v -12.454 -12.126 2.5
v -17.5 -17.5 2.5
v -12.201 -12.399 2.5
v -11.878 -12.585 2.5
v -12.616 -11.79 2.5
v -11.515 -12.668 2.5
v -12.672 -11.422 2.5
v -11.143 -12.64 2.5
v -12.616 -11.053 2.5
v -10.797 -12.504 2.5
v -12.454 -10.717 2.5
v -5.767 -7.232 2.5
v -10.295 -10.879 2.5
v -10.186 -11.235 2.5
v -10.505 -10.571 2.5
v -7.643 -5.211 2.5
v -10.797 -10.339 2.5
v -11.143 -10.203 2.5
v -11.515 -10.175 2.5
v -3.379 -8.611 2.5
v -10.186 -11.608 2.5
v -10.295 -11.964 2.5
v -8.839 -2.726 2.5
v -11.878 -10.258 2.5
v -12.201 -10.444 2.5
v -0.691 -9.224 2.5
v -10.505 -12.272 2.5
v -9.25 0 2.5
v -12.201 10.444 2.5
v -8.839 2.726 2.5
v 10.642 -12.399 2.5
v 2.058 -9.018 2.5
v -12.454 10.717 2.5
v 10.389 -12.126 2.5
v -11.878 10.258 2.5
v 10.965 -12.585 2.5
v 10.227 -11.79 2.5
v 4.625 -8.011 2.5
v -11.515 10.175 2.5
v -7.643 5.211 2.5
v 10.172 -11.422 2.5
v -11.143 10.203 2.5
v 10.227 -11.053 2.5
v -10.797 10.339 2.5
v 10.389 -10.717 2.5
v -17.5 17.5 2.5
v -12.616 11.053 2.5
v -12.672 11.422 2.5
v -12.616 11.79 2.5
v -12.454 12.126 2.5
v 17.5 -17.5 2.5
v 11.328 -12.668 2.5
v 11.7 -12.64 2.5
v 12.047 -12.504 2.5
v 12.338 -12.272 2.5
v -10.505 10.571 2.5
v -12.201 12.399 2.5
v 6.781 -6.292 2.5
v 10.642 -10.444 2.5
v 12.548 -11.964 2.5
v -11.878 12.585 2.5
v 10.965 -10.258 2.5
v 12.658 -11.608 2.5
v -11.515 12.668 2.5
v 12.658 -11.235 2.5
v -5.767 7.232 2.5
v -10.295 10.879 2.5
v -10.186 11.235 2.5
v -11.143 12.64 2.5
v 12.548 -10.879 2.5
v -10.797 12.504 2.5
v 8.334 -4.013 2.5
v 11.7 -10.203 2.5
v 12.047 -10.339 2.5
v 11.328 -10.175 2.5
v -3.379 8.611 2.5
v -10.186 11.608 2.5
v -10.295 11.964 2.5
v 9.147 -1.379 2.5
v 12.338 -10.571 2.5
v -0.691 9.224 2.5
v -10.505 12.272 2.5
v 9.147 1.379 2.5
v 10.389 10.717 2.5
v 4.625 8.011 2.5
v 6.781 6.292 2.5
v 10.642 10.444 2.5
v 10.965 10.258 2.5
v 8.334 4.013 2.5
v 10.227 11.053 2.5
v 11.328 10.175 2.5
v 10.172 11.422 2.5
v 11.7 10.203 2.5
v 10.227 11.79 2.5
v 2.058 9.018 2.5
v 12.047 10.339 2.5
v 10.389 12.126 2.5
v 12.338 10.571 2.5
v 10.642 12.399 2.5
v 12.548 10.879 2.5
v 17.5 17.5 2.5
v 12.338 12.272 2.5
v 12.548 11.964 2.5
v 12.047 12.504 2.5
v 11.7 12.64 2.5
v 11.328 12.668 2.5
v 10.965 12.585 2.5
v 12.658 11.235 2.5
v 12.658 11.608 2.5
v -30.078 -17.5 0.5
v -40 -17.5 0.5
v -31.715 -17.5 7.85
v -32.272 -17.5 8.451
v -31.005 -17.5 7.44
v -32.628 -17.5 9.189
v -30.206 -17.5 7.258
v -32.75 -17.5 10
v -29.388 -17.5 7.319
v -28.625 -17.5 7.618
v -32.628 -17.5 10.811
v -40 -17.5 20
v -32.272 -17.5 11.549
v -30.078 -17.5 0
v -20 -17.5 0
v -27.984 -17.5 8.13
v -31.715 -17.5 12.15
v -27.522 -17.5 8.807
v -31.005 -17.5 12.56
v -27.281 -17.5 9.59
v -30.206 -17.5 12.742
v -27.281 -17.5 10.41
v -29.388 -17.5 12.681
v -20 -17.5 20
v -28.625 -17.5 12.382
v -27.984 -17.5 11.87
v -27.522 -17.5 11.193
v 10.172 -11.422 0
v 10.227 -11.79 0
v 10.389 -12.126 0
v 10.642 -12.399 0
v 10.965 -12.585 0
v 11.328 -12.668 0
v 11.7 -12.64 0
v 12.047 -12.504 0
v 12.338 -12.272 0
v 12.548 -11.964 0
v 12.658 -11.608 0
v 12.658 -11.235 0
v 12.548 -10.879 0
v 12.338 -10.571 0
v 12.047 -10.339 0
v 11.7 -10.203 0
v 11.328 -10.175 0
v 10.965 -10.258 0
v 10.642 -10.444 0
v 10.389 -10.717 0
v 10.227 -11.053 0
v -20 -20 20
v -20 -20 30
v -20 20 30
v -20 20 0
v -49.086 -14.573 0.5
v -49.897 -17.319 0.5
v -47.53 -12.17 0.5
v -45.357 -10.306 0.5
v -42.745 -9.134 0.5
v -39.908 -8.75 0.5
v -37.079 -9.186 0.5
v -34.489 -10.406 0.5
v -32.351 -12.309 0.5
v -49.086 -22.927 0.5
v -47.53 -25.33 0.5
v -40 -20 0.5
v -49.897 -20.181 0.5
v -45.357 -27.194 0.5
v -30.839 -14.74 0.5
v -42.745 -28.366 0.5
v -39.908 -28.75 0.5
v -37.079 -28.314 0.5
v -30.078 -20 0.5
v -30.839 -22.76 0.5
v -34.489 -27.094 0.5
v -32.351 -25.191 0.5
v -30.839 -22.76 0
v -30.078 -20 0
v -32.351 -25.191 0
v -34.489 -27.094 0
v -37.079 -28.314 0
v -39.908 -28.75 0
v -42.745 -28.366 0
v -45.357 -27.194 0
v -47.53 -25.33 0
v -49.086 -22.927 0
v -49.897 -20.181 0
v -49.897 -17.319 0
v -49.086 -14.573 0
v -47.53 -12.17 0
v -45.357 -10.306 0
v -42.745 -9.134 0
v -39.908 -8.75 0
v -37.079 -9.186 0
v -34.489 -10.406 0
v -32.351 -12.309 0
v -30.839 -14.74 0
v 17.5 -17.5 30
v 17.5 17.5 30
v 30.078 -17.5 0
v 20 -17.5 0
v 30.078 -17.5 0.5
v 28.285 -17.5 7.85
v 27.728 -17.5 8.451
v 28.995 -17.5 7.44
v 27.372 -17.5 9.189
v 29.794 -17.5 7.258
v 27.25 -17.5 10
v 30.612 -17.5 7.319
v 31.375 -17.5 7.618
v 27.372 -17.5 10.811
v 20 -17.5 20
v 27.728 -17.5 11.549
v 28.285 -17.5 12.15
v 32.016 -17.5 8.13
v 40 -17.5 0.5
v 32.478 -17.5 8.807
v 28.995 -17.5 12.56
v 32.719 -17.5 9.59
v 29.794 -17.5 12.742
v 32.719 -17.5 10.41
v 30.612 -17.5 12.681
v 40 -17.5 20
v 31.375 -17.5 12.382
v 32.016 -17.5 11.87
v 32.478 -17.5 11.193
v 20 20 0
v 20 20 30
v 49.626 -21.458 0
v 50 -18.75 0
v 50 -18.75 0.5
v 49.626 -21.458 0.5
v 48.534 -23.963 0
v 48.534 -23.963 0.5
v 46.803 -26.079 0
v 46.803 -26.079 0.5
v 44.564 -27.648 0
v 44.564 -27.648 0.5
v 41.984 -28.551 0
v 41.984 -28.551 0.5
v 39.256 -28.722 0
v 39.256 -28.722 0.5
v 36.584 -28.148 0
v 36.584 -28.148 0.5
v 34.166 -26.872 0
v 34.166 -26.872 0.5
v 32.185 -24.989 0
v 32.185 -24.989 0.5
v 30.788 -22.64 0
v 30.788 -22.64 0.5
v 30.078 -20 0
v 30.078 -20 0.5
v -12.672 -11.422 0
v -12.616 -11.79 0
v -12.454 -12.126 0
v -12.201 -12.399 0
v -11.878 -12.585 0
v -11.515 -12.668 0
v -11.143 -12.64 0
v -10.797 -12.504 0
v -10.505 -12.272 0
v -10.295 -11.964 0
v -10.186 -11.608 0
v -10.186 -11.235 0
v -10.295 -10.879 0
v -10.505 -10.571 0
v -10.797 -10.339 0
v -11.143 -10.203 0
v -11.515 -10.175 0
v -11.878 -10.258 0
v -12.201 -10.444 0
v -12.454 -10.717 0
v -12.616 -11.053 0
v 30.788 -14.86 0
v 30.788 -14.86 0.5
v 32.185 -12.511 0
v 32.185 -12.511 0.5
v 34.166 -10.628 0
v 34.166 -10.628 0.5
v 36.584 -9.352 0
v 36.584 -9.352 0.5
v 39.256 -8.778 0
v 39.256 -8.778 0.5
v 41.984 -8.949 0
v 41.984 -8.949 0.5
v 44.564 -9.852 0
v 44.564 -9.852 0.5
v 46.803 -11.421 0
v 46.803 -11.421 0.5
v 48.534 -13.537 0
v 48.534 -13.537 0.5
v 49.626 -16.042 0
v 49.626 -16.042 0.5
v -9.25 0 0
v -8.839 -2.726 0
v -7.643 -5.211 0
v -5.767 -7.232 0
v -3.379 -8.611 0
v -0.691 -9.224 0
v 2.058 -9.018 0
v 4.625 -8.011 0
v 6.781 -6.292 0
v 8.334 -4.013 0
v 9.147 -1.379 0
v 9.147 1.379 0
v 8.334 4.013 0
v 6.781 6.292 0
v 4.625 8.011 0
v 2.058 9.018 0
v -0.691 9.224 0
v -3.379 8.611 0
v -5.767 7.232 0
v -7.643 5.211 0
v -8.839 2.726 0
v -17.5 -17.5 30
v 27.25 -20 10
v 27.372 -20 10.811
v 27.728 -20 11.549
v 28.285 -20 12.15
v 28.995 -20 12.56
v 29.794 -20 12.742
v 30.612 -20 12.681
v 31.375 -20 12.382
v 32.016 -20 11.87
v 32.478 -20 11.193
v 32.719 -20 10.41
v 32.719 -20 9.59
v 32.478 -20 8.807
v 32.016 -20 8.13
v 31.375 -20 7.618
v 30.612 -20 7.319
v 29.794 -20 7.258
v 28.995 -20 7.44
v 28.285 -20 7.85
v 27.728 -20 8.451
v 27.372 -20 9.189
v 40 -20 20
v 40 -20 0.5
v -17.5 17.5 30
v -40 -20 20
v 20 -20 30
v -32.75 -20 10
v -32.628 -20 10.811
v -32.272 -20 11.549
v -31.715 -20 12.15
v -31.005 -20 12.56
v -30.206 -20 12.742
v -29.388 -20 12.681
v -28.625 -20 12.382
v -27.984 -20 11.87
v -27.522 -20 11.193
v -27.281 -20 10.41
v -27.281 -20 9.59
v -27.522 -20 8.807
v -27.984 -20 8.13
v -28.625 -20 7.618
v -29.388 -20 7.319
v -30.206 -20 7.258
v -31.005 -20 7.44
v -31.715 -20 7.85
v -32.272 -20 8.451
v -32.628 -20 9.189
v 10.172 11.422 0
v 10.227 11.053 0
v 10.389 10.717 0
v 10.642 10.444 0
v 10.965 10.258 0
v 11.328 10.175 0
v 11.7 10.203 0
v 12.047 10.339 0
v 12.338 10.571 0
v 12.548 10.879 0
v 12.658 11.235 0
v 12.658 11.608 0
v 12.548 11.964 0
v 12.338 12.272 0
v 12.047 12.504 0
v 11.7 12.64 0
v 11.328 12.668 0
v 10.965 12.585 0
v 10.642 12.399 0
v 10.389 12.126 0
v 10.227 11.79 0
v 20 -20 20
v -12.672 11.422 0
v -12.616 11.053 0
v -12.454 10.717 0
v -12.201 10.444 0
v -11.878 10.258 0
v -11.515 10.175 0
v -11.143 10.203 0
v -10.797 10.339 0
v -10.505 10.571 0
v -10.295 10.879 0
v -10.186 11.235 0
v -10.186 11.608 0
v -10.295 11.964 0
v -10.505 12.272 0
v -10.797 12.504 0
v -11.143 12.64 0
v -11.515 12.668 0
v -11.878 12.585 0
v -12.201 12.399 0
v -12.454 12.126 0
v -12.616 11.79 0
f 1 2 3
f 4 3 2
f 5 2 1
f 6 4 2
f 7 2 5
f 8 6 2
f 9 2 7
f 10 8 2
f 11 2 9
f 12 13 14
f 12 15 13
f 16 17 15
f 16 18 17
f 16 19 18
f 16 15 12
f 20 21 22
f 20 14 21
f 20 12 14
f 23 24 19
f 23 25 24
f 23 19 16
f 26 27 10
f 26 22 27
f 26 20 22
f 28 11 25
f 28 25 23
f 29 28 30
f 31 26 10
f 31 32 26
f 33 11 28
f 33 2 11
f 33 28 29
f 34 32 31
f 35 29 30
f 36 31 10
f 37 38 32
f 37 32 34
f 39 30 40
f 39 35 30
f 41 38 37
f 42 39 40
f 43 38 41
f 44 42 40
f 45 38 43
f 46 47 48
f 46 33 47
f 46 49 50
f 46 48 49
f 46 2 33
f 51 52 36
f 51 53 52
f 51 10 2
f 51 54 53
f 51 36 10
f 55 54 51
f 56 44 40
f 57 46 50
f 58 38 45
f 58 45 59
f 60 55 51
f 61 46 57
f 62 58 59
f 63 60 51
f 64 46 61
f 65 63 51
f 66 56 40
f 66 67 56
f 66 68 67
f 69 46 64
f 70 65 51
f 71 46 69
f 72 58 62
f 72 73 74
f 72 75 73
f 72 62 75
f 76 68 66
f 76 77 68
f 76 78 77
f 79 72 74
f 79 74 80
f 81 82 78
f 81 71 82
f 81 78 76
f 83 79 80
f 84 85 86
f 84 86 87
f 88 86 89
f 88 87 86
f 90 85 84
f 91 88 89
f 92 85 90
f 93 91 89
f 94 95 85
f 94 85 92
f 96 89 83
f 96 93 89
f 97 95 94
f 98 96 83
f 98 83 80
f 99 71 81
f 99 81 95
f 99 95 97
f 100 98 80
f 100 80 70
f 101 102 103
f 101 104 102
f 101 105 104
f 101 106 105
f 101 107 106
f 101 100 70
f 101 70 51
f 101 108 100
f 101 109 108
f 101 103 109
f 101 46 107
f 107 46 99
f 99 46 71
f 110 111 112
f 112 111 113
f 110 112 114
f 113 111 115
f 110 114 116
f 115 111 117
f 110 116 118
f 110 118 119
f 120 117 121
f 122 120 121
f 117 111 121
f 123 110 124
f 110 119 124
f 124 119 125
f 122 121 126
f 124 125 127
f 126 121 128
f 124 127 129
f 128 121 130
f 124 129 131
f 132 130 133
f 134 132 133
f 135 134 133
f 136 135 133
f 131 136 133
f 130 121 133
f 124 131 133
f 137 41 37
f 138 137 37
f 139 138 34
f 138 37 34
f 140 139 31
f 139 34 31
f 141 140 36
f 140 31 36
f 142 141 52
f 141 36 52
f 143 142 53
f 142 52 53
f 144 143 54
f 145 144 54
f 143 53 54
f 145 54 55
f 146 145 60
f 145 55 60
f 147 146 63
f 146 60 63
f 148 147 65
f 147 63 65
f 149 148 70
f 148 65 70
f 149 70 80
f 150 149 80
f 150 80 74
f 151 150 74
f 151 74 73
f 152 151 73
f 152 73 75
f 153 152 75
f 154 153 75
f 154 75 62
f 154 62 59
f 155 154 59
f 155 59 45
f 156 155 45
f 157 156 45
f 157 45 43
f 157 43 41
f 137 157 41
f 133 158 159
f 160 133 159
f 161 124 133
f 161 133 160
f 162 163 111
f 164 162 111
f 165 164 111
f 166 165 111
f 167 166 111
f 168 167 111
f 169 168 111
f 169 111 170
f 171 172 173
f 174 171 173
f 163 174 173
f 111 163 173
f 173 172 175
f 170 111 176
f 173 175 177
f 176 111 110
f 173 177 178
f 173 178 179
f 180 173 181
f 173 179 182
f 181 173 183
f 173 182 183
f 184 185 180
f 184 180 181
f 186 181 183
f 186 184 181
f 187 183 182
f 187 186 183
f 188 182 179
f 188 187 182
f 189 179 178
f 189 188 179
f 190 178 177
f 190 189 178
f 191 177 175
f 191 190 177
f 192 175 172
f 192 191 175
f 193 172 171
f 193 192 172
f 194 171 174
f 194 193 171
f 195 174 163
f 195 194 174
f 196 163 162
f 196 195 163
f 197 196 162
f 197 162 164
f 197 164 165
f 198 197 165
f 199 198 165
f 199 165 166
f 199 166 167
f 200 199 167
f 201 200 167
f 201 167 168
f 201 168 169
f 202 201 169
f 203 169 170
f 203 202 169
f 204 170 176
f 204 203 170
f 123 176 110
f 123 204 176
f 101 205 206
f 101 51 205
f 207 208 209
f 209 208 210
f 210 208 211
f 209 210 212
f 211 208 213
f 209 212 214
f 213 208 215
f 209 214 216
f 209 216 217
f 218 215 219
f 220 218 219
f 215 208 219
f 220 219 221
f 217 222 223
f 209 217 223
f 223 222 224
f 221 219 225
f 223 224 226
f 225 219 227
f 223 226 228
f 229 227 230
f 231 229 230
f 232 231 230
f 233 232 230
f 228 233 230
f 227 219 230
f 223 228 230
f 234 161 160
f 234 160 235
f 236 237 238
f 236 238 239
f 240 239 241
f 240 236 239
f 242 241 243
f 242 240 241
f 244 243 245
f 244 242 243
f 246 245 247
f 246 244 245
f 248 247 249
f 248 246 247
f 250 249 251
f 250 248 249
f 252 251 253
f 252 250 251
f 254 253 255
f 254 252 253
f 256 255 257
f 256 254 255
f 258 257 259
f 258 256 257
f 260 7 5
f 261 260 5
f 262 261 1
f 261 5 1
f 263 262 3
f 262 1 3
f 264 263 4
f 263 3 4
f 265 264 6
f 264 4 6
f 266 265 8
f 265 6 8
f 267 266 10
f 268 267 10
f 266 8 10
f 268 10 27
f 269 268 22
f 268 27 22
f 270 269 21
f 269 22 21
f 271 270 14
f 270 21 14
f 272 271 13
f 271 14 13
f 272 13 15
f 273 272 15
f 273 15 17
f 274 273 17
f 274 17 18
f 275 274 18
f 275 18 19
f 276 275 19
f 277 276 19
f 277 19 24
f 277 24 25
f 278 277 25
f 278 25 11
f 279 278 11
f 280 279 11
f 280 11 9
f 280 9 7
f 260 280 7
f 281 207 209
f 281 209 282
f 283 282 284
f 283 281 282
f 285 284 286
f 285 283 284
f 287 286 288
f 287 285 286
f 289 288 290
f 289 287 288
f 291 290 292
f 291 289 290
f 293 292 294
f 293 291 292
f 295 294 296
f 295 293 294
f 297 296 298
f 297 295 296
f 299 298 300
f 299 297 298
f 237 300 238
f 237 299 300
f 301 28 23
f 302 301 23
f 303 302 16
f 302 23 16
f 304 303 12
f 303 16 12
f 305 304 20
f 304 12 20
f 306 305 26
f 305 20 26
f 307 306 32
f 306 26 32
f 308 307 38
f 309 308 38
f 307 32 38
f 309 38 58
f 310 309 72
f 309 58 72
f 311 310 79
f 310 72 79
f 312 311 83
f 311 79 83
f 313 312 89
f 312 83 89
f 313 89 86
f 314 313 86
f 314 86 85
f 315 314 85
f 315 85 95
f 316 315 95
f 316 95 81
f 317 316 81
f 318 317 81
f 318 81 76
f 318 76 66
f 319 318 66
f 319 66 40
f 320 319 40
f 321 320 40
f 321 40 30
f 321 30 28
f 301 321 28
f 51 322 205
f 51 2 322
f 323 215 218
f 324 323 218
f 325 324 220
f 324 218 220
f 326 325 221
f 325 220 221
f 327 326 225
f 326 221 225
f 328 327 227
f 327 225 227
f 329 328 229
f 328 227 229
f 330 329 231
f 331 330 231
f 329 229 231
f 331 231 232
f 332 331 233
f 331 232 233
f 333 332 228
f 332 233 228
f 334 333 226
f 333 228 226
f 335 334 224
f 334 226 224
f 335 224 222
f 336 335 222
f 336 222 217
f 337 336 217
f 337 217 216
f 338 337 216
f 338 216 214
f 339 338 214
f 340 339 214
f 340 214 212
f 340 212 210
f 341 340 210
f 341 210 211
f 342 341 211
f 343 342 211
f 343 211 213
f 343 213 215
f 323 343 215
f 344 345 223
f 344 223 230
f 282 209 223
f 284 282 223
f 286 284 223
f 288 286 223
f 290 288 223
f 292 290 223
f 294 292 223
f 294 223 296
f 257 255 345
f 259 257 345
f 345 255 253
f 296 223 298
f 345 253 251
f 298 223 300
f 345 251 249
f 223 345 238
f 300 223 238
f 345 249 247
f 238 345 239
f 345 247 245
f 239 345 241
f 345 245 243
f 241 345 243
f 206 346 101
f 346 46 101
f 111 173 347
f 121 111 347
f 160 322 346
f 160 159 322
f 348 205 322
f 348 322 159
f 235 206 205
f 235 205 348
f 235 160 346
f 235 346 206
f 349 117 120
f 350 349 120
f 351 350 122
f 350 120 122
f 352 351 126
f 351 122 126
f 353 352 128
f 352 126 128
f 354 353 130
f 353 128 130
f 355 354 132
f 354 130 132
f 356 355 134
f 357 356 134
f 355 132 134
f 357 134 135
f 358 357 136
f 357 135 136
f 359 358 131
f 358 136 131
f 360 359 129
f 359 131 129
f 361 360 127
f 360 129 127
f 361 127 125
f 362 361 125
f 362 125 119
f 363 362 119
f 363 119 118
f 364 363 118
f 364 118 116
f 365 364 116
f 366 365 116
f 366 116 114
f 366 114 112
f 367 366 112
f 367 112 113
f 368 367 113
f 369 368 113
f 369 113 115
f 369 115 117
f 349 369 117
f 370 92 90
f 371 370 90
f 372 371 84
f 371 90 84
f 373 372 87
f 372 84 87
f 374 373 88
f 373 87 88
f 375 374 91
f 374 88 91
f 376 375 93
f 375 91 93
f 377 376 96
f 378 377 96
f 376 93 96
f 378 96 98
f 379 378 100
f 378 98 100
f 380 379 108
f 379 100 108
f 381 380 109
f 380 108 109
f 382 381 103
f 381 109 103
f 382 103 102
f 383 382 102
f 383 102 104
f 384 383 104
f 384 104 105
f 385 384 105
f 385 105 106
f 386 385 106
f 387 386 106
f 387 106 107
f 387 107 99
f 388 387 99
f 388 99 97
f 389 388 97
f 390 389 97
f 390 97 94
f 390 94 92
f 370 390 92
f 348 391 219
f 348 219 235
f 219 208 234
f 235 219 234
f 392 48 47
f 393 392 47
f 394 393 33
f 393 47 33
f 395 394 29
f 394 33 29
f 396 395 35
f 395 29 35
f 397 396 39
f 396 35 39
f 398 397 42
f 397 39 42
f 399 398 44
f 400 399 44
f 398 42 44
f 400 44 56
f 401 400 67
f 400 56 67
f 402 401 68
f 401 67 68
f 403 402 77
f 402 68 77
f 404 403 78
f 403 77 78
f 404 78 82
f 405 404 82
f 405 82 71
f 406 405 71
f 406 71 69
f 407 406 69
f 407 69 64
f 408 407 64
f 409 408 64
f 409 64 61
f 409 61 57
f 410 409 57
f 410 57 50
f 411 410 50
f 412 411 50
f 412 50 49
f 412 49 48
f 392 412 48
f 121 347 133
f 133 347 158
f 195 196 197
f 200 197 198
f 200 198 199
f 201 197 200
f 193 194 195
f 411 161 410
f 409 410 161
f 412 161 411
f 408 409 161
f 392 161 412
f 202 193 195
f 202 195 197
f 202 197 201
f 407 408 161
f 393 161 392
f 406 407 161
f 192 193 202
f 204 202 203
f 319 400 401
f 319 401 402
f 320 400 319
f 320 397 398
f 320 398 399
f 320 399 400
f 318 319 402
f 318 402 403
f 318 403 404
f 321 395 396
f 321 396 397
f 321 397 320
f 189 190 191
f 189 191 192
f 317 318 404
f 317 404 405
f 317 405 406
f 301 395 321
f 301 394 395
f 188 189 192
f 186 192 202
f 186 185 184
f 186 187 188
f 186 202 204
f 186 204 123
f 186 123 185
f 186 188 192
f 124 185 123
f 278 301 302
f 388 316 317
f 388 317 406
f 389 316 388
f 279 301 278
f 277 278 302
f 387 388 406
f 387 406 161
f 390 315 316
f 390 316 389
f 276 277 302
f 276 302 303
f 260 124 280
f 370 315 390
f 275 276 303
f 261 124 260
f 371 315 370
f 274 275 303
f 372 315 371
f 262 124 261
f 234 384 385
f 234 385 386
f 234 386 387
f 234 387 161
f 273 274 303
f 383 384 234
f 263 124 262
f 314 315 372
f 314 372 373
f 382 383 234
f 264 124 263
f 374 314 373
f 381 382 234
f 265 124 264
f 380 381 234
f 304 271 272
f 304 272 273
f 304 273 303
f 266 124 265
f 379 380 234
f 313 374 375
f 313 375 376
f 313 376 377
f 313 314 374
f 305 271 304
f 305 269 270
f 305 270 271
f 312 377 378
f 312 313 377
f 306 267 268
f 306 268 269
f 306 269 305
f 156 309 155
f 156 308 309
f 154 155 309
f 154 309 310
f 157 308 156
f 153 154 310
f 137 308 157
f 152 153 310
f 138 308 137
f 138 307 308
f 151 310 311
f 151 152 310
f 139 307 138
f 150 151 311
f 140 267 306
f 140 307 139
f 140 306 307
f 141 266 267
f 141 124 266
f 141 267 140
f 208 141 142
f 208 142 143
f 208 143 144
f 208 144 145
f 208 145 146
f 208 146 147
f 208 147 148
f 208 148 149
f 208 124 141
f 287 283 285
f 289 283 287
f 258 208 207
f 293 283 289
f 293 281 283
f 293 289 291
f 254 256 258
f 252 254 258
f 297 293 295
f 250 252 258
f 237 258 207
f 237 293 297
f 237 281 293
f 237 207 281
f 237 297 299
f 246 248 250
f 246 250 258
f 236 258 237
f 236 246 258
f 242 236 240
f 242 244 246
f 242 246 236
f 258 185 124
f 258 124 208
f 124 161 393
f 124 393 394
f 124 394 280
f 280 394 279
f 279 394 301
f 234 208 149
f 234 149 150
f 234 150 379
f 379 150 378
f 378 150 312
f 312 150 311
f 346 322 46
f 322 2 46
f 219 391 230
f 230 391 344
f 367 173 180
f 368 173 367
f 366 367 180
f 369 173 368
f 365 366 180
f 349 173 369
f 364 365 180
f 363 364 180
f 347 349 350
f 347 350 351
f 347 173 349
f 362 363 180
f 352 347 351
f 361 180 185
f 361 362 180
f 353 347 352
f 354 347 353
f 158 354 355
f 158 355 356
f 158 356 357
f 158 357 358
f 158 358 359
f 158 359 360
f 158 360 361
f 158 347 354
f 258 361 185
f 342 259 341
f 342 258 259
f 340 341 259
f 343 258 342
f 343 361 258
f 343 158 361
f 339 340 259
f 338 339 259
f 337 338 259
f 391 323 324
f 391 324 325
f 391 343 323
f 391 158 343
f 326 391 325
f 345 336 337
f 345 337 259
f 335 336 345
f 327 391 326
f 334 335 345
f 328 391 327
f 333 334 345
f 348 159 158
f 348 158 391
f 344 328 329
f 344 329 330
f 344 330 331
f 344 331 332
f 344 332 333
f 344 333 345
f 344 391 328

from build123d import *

# Parameters (mm, degrees)
F0_W      = 40
F0_H      = 40
F1_DEPTH  = 30
F2_T      = -2.5
F4_D      = 2.5
F5_D      = 18.5
F6_W      = 20
F6_H      = 20
F7_DEPTH  = 2.5
F9_D      = 5.5
F11_DEPTH = 0.5


with BuildPart() as f1:
    # F0 (on Top) → F1 (new body)
    with BuildSketch(Plane.XY):
        Rectangle(F0_W, F0_H)
    extrude(amount=F1_DEPTH)

    # F2
    f2_openings = [f1.faces().sort_by_distance(p)[0] for p in [
        (0, 0, 30),
    ]]
    offset(amount=F2_T, openings=f2_openings)

    # F4 (through all)
    with Locations(Plane(origin=(0, 0, 0), x_dir=(1, 0, 0), z_dir=(0, 0, -1))):
        with Locations((-11.4215728753, 11.4215728753), (11.4215728753, 11.4215728753), (-11.4215728753, -11.4215728753), (11.4215728753, -11.4215728753)):
            Hole(F4_D / 2)

    # F5 (through all)
    with Locations(Plane(origin=(0, 0, 0), x_dir=(1, 0, 0), z_dir=(0, 0, -1))):
        with Locations((0, 0)):
            Hole(F5_D / 2)

    # F6 (on face) → F7 (join)
    with BuildSketch(Plane.XZ.offset(20)):
        with Locations((-30, 10)):
            Rectangle(F6_W, F6_H)
        with Locations((30, 10)):
            Rectangle(F6_W, F6_H)
    extrude(amount=-F7_DEPTH)

    # F9 (through all)
    with Locations(Plane.XZ.offset(20)):
        with Locations((-30, 10), (30, 10)):
            Hole(F9_D / 2)

    # F10 (on face) → F11 (join)
    with BuildSketch(Plane(origin=(0, 0, 0), x_dir=(1, 0, 0), z_dir=(0, 0, -1))):
        with BuildLine():
            ThreePointArc((50, 18.75), (40.6262291254, 28.7303725924), (30.0784325835, 20))
            Line((30.0784325835, 20), (40, 20))
            Line((40, 20), (40, 17.5))
            Line((40, 17.5), (30.0784325835, 17.5))
            ThreePointArc((30.0784325835, 17.5), (40.6262291254, 8.7696274076), (50, 18.75))
        make_face()
        with BuildLine():
            Line((-40, 20), (-30.0784325835, 20))
            ThreePointArc((-30.0784325835, 20), (-50, 18.75), (-30.0784325835, 17.5))
            Line((-30.0784325835, 17.5), (-40, 17.5))
            Line((-40, 17.5), (-40, 20))
        make_face()
    extrude(amount=-F11_DEPTH)


solid = f1.part
